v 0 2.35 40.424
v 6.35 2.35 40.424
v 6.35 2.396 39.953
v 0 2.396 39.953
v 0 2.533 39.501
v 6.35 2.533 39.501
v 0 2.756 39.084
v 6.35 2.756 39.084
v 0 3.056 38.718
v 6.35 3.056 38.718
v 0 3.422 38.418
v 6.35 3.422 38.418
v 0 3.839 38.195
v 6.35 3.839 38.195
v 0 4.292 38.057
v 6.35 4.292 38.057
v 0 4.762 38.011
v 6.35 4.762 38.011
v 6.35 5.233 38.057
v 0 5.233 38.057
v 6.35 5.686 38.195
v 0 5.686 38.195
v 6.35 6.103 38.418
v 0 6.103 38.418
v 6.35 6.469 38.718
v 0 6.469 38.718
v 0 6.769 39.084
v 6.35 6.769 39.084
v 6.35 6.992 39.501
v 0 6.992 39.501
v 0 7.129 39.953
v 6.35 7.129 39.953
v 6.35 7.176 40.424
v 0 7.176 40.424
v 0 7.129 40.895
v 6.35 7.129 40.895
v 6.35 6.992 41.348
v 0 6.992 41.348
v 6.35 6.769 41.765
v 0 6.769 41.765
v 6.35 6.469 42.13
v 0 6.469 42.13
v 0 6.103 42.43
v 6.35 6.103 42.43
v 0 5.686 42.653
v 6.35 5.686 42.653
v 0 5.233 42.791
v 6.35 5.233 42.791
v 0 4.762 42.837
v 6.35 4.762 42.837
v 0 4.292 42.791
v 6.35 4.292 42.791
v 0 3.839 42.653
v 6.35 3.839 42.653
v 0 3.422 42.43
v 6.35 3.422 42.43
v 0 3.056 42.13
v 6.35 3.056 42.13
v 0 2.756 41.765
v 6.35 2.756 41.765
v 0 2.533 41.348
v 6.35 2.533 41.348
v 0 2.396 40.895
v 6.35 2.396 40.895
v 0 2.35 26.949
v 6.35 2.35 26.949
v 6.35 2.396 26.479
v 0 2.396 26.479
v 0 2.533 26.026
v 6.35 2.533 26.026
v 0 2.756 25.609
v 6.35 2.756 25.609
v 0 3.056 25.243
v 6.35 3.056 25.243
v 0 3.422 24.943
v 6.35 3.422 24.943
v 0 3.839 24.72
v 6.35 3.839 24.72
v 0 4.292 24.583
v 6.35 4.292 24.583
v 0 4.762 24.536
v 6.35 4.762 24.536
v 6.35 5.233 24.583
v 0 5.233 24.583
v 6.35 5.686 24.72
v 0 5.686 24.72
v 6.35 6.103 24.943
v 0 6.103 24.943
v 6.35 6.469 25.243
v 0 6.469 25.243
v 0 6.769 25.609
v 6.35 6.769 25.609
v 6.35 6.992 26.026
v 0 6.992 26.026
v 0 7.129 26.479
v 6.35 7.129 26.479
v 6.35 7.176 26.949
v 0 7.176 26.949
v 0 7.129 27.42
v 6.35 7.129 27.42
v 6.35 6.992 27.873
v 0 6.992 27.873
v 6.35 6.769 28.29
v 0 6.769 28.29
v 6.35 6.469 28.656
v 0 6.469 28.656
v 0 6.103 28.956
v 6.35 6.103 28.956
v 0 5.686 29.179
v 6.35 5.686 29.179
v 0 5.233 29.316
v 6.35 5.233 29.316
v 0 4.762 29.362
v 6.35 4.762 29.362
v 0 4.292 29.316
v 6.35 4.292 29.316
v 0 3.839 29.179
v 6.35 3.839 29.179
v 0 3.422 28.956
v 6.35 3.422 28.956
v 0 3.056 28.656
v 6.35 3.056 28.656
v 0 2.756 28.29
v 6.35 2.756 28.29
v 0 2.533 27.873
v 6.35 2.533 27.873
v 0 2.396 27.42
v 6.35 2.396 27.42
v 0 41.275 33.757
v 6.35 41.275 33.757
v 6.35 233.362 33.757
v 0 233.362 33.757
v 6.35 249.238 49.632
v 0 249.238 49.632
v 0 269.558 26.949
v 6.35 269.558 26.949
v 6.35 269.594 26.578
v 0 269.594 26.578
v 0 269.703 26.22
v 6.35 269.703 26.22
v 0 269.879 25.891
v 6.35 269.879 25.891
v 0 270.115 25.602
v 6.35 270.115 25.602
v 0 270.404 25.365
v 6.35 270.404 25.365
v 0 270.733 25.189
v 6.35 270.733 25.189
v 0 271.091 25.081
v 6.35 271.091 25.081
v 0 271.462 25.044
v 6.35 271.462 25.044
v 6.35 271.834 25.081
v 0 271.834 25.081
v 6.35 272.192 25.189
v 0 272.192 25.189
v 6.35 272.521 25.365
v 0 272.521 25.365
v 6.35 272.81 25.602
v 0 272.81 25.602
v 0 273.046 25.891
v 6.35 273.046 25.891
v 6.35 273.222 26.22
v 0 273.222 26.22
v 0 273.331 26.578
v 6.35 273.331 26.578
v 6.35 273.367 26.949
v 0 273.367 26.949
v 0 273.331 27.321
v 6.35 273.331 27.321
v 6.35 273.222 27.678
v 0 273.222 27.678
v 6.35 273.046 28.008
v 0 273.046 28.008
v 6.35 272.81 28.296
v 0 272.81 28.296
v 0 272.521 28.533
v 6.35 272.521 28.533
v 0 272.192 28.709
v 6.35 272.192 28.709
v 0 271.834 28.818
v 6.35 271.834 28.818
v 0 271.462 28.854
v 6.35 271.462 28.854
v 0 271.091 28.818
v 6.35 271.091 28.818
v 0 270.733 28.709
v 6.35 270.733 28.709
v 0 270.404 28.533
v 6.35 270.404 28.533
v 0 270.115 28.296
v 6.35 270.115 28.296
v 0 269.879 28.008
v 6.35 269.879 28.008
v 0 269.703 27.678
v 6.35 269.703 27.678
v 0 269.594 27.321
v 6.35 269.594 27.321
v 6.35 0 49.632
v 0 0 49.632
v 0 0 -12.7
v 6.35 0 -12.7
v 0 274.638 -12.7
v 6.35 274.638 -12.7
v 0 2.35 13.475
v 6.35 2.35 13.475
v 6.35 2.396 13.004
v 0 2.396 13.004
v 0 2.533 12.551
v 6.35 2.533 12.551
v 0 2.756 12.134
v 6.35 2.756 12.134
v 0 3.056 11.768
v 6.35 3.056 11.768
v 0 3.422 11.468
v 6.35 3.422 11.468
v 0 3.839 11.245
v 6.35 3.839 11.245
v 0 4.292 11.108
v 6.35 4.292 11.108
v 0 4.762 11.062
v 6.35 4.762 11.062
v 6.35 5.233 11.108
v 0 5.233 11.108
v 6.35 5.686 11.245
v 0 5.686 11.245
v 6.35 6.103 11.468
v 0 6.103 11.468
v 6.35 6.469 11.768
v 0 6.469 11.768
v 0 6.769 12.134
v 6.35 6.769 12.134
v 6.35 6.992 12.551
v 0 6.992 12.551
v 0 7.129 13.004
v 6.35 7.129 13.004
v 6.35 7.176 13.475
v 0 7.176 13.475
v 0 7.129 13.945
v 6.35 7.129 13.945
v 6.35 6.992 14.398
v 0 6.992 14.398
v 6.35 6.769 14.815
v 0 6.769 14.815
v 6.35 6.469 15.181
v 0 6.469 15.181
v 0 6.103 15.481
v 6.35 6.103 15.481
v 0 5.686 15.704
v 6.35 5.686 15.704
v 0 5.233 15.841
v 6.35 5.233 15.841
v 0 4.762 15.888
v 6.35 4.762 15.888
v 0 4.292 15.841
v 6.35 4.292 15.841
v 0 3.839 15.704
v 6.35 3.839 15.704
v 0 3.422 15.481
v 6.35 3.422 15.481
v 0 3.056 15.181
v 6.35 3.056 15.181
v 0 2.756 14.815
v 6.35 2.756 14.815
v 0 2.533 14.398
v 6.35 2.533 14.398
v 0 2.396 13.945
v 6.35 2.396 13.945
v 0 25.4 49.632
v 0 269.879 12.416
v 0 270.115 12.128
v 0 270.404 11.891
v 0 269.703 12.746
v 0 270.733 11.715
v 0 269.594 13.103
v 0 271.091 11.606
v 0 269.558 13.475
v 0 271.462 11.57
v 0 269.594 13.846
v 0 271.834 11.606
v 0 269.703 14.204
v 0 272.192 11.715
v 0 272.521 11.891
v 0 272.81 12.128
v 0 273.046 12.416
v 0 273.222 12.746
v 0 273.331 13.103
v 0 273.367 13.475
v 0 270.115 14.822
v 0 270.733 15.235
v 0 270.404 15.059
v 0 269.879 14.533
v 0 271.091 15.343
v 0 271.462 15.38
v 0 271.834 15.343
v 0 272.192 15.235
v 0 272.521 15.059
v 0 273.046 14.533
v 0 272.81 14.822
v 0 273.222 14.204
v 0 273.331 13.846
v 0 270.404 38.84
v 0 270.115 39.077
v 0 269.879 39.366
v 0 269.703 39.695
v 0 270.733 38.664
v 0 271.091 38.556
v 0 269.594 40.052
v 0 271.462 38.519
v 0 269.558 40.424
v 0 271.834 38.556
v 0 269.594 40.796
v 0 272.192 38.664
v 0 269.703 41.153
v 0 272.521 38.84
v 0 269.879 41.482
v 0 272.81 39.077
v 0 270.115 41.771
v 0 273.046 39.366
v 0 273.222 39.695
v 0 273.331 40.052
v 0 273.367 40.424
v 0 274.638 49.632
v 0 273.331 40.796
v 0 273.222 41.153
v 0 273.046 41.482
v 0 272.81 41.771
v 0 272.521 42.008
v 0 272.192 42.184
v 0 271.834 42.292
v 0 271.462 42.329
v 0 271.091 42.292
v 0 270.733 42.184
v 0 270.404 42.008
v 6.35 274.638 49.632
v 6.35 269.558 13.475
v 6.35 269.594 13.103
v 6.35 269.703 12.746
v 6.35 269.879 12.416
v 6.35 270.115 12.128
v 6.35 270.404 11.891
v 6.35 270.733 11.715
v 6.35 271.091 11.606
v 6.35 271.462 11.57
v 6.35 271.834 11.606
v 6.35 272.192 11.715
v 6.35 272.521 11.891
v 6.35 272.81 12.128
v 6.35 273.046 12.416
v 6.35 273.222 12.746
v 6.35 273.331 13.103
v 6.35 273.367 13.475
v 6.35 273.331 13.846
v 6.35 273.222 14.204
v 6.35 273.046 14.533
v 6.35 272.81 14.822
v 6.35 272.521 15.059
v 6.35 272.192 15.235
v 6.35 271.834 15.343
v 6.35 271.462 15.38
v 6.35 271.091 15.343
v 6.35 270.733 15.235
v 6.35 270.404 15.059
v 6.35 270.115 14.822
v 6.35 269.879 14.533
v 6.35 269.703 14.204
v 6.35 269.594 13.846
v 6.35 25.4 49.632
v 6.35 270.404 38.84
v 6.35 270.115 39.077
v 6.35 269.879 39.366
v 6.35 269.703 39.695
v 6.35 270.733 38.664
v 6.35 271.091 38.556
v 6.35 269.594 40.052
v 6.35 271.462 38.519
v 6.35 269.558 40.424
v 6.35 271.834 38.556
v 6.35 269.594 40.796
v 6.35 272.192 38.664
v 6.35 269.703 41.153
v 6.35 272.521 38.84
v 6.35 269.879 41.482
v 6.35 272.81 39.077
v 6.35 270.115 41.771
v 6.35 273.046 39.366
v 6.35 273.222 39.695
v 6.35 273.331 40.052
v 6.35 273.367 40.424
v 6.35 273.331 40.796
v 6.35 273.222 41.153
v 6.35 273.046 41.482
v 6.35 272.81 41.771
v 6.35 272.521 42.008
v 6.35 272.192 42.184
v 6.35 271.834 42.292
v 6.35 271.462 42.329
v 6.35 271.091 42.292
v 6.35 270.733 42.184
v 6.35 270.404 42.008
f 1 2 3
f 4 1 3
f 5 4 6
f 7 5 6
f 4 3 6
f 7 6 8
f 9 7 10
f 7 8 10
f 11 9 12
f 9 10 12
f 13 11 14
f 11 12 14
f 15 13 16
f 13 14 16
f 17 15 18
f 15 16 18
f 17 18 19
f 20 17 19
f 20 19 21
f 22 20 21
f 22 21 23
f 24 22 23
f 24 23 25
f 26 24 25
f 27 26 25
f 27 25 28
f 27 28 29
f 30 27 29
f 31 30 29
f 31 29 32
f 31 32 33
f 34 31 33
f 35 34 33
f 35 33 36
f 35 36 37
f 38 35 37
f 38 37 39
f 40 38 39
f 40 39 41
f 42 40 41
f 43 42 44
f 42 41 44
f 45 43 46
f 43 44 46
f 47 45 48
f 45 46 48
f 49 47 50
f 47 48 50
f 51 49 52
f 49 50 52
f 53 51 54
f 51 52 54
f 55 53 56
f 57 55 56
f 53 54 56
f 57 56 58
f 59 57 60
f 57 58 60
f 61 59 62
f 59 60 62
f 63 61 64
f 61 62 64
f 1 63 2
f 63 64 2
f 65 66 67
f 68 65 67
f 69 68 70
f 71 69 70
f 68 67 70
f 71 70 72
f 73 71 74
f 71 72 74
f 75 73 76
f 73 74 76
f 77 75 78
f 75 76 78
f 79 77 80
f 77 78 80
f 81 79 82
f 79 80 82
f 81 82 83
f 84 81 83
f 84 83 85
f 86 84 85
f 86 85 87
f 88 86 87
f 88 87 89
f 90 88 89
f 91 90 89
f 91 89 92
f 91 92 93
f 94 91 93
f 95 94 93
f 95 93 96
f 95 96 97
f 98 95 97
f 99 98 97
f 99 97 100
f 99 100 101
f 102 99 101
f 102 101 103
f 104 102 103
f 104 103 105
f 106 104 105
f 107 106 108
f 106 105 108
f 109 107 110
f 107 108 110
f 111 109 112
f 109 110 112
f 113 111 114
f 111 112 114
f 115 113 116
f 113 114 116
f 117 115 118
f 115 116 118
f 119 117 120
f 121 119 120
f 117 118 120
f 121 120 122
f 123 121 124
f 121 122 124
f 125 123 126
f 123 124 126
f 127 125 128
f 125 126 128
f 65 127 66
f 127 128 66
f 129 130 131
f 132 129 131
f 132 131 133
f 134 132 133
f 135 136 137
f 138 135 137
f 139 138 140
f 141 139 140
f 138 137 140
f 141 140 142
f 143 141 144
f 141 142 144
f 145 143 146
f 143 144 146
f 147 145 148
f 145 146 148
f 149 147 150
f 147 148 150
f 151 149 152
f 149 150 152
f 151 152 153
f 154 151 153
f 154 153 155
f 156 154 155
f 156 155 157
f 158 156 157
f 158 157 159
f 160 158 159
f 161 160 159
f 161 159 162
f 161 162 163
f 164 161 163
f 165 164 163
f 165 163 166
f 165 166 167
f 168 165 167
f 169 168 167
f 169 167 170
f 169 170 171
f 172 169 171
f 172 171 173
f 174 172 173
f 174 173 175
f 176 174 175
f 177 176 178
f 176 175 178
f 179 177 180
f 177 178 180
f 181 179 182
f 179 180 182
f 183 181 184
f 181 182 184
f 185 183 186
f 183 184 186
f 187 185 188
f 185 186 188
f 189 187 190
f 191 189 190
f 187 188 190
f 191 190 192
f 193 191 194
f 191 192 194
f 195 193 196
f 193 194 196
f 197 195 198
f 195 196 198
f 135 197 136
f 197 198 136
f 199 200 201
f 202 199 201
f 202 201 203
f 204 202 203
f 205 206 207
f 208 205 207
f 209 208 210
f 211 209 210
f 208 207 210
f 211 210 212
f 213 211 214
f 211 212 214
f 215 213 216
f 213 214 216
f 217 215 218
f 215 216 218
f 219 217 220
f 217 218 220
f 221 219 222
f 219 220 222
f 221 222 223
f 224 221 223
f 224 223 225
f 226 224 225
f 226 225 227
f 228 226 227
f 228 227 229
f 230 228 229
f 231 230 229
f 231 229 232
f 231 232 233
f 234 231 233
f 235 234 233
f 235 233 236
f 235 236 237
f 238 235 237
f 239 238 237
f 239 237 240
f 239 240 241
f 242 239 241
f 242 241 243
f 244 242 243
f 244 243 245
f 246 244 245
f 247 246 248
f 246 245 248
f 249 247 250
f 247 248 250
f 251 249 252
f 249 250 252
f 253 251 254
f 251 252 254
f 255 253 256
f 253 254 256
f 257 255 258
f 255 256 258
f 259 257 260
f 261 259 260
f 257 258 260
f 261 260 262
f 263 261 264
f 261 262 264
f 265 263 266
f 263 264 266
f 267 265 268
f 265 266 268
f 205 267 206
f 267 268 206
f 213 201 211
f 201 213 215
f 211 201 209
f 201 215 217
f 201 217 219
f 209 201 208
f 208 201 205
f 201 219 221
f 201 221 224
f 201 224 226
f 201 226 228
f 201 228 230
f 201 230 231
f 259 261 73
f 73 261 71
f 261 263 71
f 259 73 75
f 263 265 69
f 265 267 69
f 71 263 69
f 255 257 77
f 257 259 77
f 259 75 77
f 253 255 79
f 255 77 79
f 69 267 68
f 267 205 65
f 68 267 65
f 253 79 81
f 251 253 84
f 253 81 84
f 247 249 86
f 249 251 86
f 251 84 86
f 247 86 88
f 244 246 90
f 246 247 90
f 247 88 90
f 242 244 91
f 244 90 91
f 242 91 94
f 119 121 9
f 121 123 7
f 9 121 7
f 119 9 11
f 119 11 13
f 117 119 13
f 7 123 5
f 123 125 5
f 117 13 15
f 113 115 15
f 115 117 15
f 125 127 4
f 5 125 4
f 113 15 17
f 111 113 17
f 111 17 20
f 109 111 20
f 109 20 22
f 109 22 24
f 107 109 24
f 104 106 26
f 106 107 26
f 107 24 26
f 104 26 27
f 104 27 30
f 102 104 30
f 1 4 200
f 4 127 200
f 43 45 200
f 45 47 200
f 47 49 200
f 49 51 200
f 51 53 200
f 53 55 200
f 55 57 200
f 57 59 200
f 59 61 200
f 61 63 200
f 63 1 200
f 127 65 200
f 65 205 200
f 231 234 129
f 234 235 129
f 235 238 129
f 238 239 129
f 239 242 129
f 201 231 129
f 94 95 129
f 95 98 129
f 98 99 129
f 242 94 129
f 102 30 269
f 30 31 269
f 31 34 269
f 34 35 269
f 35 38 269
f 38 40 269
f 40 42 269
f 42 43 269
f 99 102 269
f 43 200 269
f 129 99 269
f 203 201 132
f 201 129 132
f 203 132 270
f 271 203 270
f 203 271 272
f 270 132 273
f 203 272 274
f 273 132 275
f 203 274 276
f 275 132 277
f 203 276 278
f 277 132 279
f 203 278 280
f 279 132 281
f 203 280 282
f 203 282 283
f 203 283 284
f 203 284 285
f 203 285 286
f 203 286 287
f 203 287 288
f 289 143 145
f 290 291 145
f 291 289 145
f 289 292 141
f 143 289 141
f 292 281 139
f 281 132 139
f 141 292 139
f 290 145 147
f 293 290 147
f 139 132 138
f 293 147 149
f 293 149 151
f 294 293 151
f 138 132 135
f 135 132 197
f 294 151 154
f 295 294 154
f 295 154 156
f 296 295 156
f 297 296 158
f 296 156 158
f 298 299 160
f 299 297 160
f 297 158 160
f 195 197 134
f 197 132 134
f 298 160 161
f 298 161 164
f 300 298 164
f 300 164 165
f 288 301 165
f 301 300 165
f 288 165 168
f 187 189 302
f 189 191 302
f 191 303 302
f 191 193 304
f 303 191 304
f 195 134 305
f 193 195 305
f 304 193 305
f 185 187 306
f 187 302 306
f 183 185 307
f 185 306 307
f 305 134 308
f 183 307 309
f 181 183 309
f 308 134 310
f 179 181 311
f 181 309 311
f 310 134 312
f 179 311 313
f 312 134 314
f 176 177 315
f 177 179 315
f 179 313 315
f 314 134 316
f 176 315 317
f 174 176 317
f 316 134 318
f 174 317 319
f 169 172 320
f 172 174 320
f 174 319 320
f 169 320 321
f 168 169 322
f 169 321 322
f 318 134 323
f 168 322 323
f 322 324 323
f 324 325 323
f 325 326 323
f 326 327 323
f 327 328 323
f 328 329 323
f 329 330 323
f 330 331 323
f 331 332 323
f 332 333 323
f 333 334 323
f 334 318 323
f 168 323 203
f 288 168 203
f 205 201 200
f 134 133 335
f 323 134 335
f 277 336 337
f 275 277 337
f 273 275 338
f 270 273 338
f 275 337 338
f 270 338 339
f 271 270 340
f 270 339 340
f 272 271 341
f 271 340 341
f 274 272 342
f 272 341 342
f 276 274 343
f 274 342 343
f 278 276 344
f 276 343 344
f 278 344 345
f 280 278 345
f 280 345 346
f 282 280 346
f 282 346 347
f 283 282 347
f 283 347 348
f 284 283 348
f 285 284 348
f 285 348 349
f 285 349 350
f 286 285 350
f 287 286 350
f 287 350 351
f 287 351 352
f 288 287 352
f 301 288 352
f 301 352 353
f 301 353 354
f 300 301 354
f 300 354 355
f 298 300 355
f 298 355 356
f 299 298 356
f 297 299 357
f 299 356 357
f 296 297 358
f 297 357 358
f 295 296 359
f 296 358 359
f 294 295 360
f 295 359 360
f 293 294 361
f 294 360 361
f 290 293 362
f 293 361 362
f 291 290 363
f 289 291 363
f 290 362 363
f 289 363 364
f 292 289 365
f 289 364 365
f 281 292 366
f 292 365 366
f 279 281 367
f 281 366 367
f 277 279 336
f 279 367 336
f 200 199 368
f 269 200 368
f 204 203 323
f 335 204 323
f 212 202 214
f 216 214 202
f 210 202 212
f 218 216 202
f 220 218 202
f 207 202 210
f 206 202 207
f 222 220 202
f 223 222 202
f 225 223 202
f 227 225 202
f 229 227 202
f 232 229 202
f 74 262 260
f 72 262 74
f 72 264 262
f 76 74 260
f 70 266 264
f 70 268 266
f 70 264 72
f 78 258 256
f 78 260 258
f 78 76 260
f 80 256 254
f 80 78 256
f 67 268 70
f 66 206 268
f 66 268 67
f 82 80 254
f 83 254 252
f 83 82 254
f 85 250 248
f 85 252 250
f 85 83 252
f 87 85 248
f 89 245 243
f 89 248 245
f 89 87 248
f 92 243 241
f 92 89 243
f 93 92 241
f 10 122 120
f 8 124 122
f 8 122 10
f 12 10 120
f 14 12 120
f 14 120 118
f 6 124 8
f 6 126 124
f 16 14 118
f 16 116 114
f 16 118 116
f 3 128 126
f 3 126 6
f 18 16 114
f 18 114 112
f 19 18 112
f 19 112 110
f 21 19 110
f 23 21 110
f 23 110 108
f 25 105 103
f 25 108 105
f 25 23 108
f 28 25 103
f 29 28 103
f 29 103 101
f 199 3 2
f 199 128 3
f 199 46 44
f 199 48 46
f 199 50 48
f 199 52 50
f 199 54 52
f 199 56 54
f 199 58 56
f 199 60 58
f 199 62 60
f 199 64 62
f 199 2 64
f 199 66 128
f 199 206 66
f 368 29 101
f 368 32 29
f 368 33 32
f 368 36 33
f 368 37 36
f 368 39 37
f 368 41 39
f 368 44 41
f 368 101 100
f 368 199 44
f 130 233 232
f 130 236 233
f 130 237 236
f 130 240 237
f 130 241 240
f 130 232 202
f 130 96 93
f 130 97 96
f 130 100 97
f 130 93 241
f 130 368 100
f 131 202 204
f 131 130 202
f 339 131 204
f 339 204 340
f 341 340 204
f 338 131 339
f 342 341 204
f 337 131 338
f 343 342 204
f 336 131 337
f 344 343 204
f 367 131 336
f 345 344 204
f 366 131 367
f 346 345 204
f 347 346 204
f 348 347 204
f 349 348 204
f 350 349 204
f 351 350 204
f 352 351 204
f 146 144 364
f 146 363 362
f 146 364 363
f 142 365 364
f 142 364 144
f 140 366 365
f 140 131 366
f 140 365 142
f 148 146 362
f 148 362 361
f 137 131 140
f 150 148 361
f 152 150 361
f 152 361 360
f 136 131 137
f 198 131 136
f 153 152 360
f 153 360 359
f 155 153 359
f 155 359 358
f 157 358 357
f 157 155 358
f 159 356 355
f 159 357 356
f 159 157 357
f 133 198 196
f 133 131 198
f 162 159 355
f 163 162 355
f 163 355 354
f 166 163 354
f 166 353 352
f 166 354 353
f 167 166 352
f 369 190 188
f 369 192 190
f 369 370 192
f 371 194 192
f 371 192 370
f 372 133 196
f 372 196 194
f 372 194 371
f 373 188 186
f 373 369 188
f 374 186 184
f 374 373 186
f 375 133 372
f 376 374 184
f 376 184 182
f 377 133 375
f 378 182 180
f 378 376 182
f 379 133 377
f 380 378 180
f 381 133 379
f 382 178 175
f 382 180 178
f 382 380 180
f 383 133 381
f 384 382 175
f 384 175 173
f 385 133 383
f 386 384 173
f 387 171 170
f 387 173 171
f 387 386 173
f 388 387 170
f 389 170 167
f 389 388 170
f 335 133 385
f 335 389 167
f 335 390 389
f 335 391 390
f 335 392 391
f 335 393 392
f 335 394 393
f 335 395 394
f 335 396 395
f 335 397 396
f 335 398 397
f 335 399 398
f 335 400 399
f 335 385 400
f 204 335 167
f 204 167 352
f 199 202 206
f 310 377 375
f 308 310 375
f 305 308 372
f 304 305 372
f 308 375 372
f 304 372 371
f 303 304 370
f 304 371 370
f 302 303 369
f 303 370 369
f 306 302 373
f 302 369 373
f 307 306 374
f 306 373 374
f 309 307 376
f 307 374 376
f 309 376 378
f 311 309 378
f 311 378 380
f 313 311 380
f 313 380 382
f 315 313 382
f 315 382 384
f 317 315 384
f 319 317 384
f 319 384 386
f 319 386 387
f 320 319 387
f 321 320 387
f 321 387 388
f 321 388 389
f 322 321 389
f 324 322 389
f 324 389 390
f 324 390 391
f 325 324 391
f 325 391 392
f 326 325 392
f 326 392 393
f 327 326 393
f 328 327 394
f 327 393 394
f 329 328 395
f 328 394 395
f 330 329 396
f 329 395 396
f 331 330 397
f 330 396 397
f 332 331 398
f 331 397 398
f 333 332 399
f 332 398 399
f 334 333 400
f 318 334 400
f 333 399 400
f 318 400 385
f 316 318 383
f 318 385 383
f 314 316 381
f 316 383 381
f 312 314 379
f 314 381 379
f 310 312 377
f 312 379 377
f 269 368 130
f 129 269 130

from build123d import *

# Parameters (mm, degrees)
F1_DEPTH = 6.35
F2_D     = 4.826
F3_D     = 3.81
F5_DEPTH = 25.4


# Not quite as in the source:
# - a feature names something its author has since deleted; it is built from what else it names


with BuildPart() as f1:
    # F0 (on Right) → F1 (new body)
    with BuildSketch(Plane.YZ):
        Polygon((274.6375, -12.7), (274.6375, 0), (274.6375, 53.8988), (0, 53.8988), (0, 0), (0, -12.7), align=None)
    extrude(amount=F1_DEPTH)

    # F2 (through all)
    with Locations(Plane(origin=(0, 0, 0), x_dir=(0, 1, 0), z_dir=(-1, 0, 0))):
        with Locations((4.7625, -40.4241), (4.7625, -26.9494), (4.7625, -13.4747)):
            Hole(F2_D / 2)

    # F3 (through all)
    with Locations(Plane(origin=(0, 0, 0), x_dir=(0, 1, 0), z_dir=(-1, 0, 0))):
        with Locations((271.4625, -40.4241), (271.4625, -26.9494), (271.4625, -13.4747)):
            Hole(F3_D / 2)

    # F4 (on face) → F5 (cut)
    with BuildSketch(Plane.YZ.offset(6.35)):
        Polygon((0, 53.8988), (0, 49.6316), (25.4, 49.6316), (41.275, 33.7566), (233.3625, 33.7566), (249.2375, 49.6316), (274.6375, 49.6316), (274.6375, 53.8988), align=None)
    extrude(amount=-F5_DEPTH, mode=Mode.SUBTRACT)


solid = f1.part
